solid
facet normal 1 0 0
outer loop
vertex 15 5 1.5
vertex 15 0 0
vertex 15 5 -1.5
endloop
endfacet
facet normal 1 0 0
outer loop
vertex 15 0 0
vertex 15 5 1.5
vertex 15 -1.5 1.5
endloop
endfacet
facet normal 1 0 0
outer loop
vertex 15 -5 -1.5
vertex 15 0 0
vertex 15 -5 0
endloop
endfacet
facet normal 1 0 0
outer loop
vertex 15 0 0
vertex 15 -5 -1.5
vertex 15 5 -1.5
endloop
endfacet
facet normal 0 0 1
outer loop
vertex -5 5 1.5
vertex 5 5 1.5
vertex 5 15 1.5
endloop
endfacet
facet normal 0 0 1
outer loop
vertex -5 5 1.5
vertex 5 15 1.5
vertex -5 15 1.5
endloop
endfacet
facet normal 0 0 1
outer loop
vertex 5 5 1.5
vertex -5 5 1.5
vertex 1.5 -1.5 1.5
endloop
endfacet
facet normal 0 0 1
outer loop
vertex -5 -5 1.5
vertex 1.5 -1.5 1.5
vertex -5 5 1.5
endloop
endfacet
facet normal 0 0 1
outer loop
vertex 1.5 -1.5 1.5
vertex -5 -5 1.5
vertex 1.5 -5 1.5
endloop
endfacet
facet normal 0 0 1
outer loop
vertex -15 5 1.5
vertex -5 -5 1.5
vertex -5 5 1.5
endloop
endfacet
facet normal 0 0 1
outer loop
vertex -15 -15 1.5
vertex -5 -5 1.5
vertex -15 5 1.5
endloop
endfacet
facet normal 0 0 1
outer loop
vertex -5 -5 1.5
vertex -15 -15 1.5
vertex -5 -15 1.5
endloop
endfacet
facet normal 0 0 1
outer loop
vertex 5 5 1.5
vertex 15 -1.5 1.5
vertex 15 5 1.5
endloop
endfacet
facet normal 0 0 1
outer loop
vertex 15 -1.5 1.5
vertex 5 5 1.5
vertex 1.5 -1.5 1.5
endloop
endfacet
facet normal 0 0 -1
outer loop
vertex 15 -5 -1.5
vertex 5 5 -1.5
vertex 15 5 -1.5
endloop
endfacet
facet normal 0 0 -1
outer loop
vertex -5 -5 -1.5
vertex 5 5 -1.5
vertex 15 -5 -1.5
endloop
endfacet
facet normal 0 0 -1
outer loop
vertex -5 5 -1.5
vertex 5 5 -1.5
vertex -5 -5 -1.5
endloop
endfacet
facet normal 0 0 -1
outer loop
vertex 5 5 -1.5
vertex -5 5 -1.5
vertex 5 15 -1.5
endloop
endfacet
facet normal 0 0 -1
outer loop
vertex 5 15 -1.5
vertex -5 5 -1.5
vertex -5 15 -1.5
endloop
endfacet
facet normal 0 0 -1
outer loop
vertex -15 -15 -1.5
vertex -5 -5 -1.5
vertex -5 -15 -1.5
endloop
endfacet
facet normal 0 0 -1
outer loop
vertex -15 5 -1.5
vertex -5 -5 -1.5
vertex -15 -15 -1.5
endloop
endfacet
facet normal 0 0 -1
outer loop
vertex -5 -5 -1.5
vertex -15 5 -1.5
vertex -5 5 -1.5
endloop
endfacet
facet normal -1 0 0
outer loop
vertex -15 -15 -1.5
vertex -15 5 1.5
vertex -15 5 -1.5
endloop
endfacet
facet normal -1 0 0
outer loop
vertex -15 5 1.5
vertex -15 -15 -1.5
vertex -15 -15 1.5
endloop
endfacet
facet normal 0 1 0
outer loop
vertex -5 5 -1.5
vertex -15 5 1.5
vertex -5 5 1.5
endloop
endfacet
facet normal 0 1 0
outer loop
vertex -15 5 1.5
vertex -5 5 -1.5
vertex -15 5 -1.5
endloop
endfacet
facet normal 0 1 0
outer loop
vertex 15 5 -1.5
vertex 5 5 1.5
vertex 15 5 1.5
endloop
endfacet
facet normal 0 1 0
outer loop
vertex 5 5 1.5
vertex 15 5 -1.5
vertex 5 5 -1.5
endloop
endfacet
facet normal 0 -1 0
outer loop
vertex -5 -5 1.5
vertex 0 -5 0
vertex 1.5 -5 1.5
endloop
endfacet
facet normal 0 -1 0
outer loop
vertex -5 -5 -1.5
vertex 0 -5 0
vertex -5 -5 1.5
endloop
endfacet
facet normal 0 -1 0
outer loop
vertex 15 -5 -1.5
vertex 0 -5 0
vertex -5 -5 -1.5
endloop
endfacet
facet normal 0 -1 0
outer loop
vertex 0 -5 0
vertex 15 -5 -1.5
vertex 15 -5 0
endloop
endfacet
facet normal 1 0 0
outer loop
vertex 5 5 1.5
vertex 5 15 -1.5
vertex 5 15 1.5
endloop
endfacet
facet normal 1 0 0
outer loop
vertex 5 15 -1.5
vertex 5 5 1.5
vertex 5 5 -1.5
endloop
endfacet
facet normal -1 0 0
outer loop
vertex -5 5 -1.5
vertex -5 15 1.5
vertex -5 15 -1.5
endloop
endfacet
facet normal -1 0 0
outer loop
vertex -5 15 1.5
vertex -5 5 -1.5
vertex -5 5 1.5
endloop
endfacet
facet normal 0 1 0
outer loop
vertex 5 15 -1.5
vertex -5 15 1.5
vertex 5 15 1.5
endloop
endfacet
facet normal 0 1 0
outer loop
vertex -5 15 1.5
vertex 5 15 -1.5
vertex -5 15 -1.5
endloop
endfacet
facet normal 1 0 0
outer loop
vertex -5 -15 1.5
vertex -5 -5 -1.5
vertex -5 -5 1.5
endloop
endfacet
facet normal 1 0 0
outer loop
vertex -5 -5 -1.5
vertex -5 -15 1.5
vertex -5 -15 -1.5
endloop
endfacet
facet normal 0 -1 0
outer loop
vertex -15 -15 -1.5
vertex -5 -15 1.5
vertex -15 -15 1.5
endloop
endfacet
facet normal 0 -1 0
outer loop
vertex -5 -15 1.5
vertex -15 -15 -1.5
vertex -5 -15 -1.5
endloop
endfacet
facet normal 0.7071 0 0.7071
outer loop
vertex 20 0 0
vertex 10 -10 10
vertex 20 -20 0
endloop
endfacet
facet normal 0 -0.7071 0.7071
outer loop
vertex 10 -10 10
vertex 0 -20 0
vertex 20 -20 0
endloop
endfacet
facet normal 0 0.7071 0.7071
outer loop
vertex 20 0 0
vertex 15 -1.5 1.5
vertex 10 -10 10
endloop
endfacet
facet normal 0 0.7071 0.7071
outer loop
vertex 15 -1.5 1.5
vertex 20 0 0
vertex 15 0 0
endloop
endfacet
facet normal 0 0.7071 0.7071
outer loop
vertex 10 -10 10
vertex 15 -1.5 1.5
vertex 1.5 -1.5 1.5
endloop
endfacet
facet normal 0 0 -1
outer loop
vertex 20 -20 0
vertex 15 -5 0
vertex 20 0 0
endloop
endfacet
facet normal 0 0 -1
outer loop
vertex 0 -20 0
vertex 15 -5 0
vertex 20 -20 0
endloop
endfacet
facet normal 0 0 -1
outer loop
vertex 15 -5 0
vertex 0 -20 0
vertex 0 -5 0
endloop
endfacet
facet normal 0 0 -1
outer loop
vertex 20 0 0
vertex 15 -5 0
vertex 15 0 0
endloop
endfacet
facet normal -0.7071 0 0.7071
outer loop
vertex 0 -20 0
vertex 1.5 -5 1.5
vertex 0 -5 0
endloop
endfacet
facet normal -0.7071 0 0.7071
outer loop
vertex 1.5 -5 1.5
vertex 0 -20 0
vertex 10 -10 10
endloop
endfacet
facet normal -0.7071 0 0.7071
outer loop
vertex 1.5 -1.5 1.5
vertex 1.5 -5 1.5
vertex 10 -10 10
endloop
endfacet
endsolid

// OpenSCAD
module front_module_positioner(x, y, z)
{
	//parameters
	padding = 0.1;
	module screw_hole()
	{
		#cylinder(h = (z + padding), r = 1.5, $fn = 10, center = true);
	}

	difference()
	{
		union()
		{
			cube([x, y, z], center = true);

			translate([0,((y/2) + 5), 0])
			{
				cube([10, 10, z], center = true);
			}

			translate([-10, -((y/2) + 5), 0])
			{
				cube([10, 10, z], center = true);
			}

			translate([10, -((y/2) + 5), 0])
			{
				polyhedron(points = [[10, 10, 0], [10, -10, 0], [-10, -10, 0], [-10, 10, 0], [0, 0, 10]], faces = [[0, 1, 4], [1, 2, 4], [2, 3, 4], [3, 0, 4], [1, 0, 3], [2, 1, 3]]);
			}
		}
	}
}

front_module_positioner(30, 10, 3);
